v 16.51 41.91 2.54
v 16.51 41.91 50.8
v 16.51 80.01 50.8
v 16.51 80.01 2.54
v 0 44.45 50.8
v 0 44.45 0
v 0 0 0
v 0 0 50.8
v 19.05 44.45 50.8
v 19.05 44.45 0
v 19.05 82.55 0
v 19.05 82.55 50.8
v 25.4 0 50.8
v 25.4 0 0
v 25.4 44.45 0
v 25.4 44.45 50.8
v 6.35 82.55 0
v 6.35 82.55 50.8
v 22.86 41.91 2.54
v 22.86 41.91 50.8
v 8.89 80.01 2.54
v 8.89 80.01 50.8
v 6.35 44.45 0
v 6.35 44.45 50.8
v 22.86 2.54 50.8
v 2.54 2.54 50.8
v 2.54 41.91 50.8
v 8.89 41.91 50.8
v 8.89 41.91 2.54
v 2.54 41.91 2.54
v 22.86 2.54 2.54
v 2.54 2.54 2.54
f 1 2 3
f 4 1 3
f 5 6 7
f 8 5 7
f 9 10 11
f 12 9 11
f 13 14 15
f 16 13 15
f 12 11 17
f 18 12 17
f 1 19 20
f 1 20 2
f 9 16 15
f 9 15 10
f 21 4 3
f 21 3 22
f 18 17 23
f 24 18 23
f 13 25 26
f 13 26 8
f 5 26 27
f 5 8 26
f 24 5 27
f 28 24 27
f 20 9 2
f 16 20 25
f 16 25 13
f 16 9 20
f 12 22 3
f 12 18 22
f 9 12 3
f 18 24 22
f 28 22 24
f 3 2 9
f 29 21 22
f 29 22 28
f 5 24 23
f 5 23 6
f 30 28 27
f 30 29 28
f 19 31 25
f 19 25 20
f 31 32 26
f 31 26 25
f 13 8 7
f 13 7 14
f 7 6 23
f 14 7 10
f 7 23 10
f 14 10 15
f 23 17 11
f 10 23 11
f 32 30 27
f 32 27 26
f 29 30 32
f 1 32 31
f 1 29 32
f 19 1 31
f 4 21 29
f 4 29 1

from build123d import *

# Parameters (mm, degrees)
F1_DEPTH = 50.8
F2_T     = -2.54


with BuildPart() as f1:
    # F0 (on Top) → F1 (new body)
    with BuildSketch(Plane.XY):
        Polygon((0, 44.45), (0, 0), (25.4, 0), (25.4, 44.45), (19.05, 44.45), (19.05, 82.55), (6.35, 82.55), (6.35, 44.45), align=None)
    extrude(amount=F1_DEPTH)

    # F2
    f2_openings = [f1.faces().sort_by_distance(p)[0] for p in [
        (12.7, 34.6075, 50.8),
    ]]
    offset(amount=F2_T, openings=f2_openings, kind=Kind.INTERSECTION)


solid = f1.part
